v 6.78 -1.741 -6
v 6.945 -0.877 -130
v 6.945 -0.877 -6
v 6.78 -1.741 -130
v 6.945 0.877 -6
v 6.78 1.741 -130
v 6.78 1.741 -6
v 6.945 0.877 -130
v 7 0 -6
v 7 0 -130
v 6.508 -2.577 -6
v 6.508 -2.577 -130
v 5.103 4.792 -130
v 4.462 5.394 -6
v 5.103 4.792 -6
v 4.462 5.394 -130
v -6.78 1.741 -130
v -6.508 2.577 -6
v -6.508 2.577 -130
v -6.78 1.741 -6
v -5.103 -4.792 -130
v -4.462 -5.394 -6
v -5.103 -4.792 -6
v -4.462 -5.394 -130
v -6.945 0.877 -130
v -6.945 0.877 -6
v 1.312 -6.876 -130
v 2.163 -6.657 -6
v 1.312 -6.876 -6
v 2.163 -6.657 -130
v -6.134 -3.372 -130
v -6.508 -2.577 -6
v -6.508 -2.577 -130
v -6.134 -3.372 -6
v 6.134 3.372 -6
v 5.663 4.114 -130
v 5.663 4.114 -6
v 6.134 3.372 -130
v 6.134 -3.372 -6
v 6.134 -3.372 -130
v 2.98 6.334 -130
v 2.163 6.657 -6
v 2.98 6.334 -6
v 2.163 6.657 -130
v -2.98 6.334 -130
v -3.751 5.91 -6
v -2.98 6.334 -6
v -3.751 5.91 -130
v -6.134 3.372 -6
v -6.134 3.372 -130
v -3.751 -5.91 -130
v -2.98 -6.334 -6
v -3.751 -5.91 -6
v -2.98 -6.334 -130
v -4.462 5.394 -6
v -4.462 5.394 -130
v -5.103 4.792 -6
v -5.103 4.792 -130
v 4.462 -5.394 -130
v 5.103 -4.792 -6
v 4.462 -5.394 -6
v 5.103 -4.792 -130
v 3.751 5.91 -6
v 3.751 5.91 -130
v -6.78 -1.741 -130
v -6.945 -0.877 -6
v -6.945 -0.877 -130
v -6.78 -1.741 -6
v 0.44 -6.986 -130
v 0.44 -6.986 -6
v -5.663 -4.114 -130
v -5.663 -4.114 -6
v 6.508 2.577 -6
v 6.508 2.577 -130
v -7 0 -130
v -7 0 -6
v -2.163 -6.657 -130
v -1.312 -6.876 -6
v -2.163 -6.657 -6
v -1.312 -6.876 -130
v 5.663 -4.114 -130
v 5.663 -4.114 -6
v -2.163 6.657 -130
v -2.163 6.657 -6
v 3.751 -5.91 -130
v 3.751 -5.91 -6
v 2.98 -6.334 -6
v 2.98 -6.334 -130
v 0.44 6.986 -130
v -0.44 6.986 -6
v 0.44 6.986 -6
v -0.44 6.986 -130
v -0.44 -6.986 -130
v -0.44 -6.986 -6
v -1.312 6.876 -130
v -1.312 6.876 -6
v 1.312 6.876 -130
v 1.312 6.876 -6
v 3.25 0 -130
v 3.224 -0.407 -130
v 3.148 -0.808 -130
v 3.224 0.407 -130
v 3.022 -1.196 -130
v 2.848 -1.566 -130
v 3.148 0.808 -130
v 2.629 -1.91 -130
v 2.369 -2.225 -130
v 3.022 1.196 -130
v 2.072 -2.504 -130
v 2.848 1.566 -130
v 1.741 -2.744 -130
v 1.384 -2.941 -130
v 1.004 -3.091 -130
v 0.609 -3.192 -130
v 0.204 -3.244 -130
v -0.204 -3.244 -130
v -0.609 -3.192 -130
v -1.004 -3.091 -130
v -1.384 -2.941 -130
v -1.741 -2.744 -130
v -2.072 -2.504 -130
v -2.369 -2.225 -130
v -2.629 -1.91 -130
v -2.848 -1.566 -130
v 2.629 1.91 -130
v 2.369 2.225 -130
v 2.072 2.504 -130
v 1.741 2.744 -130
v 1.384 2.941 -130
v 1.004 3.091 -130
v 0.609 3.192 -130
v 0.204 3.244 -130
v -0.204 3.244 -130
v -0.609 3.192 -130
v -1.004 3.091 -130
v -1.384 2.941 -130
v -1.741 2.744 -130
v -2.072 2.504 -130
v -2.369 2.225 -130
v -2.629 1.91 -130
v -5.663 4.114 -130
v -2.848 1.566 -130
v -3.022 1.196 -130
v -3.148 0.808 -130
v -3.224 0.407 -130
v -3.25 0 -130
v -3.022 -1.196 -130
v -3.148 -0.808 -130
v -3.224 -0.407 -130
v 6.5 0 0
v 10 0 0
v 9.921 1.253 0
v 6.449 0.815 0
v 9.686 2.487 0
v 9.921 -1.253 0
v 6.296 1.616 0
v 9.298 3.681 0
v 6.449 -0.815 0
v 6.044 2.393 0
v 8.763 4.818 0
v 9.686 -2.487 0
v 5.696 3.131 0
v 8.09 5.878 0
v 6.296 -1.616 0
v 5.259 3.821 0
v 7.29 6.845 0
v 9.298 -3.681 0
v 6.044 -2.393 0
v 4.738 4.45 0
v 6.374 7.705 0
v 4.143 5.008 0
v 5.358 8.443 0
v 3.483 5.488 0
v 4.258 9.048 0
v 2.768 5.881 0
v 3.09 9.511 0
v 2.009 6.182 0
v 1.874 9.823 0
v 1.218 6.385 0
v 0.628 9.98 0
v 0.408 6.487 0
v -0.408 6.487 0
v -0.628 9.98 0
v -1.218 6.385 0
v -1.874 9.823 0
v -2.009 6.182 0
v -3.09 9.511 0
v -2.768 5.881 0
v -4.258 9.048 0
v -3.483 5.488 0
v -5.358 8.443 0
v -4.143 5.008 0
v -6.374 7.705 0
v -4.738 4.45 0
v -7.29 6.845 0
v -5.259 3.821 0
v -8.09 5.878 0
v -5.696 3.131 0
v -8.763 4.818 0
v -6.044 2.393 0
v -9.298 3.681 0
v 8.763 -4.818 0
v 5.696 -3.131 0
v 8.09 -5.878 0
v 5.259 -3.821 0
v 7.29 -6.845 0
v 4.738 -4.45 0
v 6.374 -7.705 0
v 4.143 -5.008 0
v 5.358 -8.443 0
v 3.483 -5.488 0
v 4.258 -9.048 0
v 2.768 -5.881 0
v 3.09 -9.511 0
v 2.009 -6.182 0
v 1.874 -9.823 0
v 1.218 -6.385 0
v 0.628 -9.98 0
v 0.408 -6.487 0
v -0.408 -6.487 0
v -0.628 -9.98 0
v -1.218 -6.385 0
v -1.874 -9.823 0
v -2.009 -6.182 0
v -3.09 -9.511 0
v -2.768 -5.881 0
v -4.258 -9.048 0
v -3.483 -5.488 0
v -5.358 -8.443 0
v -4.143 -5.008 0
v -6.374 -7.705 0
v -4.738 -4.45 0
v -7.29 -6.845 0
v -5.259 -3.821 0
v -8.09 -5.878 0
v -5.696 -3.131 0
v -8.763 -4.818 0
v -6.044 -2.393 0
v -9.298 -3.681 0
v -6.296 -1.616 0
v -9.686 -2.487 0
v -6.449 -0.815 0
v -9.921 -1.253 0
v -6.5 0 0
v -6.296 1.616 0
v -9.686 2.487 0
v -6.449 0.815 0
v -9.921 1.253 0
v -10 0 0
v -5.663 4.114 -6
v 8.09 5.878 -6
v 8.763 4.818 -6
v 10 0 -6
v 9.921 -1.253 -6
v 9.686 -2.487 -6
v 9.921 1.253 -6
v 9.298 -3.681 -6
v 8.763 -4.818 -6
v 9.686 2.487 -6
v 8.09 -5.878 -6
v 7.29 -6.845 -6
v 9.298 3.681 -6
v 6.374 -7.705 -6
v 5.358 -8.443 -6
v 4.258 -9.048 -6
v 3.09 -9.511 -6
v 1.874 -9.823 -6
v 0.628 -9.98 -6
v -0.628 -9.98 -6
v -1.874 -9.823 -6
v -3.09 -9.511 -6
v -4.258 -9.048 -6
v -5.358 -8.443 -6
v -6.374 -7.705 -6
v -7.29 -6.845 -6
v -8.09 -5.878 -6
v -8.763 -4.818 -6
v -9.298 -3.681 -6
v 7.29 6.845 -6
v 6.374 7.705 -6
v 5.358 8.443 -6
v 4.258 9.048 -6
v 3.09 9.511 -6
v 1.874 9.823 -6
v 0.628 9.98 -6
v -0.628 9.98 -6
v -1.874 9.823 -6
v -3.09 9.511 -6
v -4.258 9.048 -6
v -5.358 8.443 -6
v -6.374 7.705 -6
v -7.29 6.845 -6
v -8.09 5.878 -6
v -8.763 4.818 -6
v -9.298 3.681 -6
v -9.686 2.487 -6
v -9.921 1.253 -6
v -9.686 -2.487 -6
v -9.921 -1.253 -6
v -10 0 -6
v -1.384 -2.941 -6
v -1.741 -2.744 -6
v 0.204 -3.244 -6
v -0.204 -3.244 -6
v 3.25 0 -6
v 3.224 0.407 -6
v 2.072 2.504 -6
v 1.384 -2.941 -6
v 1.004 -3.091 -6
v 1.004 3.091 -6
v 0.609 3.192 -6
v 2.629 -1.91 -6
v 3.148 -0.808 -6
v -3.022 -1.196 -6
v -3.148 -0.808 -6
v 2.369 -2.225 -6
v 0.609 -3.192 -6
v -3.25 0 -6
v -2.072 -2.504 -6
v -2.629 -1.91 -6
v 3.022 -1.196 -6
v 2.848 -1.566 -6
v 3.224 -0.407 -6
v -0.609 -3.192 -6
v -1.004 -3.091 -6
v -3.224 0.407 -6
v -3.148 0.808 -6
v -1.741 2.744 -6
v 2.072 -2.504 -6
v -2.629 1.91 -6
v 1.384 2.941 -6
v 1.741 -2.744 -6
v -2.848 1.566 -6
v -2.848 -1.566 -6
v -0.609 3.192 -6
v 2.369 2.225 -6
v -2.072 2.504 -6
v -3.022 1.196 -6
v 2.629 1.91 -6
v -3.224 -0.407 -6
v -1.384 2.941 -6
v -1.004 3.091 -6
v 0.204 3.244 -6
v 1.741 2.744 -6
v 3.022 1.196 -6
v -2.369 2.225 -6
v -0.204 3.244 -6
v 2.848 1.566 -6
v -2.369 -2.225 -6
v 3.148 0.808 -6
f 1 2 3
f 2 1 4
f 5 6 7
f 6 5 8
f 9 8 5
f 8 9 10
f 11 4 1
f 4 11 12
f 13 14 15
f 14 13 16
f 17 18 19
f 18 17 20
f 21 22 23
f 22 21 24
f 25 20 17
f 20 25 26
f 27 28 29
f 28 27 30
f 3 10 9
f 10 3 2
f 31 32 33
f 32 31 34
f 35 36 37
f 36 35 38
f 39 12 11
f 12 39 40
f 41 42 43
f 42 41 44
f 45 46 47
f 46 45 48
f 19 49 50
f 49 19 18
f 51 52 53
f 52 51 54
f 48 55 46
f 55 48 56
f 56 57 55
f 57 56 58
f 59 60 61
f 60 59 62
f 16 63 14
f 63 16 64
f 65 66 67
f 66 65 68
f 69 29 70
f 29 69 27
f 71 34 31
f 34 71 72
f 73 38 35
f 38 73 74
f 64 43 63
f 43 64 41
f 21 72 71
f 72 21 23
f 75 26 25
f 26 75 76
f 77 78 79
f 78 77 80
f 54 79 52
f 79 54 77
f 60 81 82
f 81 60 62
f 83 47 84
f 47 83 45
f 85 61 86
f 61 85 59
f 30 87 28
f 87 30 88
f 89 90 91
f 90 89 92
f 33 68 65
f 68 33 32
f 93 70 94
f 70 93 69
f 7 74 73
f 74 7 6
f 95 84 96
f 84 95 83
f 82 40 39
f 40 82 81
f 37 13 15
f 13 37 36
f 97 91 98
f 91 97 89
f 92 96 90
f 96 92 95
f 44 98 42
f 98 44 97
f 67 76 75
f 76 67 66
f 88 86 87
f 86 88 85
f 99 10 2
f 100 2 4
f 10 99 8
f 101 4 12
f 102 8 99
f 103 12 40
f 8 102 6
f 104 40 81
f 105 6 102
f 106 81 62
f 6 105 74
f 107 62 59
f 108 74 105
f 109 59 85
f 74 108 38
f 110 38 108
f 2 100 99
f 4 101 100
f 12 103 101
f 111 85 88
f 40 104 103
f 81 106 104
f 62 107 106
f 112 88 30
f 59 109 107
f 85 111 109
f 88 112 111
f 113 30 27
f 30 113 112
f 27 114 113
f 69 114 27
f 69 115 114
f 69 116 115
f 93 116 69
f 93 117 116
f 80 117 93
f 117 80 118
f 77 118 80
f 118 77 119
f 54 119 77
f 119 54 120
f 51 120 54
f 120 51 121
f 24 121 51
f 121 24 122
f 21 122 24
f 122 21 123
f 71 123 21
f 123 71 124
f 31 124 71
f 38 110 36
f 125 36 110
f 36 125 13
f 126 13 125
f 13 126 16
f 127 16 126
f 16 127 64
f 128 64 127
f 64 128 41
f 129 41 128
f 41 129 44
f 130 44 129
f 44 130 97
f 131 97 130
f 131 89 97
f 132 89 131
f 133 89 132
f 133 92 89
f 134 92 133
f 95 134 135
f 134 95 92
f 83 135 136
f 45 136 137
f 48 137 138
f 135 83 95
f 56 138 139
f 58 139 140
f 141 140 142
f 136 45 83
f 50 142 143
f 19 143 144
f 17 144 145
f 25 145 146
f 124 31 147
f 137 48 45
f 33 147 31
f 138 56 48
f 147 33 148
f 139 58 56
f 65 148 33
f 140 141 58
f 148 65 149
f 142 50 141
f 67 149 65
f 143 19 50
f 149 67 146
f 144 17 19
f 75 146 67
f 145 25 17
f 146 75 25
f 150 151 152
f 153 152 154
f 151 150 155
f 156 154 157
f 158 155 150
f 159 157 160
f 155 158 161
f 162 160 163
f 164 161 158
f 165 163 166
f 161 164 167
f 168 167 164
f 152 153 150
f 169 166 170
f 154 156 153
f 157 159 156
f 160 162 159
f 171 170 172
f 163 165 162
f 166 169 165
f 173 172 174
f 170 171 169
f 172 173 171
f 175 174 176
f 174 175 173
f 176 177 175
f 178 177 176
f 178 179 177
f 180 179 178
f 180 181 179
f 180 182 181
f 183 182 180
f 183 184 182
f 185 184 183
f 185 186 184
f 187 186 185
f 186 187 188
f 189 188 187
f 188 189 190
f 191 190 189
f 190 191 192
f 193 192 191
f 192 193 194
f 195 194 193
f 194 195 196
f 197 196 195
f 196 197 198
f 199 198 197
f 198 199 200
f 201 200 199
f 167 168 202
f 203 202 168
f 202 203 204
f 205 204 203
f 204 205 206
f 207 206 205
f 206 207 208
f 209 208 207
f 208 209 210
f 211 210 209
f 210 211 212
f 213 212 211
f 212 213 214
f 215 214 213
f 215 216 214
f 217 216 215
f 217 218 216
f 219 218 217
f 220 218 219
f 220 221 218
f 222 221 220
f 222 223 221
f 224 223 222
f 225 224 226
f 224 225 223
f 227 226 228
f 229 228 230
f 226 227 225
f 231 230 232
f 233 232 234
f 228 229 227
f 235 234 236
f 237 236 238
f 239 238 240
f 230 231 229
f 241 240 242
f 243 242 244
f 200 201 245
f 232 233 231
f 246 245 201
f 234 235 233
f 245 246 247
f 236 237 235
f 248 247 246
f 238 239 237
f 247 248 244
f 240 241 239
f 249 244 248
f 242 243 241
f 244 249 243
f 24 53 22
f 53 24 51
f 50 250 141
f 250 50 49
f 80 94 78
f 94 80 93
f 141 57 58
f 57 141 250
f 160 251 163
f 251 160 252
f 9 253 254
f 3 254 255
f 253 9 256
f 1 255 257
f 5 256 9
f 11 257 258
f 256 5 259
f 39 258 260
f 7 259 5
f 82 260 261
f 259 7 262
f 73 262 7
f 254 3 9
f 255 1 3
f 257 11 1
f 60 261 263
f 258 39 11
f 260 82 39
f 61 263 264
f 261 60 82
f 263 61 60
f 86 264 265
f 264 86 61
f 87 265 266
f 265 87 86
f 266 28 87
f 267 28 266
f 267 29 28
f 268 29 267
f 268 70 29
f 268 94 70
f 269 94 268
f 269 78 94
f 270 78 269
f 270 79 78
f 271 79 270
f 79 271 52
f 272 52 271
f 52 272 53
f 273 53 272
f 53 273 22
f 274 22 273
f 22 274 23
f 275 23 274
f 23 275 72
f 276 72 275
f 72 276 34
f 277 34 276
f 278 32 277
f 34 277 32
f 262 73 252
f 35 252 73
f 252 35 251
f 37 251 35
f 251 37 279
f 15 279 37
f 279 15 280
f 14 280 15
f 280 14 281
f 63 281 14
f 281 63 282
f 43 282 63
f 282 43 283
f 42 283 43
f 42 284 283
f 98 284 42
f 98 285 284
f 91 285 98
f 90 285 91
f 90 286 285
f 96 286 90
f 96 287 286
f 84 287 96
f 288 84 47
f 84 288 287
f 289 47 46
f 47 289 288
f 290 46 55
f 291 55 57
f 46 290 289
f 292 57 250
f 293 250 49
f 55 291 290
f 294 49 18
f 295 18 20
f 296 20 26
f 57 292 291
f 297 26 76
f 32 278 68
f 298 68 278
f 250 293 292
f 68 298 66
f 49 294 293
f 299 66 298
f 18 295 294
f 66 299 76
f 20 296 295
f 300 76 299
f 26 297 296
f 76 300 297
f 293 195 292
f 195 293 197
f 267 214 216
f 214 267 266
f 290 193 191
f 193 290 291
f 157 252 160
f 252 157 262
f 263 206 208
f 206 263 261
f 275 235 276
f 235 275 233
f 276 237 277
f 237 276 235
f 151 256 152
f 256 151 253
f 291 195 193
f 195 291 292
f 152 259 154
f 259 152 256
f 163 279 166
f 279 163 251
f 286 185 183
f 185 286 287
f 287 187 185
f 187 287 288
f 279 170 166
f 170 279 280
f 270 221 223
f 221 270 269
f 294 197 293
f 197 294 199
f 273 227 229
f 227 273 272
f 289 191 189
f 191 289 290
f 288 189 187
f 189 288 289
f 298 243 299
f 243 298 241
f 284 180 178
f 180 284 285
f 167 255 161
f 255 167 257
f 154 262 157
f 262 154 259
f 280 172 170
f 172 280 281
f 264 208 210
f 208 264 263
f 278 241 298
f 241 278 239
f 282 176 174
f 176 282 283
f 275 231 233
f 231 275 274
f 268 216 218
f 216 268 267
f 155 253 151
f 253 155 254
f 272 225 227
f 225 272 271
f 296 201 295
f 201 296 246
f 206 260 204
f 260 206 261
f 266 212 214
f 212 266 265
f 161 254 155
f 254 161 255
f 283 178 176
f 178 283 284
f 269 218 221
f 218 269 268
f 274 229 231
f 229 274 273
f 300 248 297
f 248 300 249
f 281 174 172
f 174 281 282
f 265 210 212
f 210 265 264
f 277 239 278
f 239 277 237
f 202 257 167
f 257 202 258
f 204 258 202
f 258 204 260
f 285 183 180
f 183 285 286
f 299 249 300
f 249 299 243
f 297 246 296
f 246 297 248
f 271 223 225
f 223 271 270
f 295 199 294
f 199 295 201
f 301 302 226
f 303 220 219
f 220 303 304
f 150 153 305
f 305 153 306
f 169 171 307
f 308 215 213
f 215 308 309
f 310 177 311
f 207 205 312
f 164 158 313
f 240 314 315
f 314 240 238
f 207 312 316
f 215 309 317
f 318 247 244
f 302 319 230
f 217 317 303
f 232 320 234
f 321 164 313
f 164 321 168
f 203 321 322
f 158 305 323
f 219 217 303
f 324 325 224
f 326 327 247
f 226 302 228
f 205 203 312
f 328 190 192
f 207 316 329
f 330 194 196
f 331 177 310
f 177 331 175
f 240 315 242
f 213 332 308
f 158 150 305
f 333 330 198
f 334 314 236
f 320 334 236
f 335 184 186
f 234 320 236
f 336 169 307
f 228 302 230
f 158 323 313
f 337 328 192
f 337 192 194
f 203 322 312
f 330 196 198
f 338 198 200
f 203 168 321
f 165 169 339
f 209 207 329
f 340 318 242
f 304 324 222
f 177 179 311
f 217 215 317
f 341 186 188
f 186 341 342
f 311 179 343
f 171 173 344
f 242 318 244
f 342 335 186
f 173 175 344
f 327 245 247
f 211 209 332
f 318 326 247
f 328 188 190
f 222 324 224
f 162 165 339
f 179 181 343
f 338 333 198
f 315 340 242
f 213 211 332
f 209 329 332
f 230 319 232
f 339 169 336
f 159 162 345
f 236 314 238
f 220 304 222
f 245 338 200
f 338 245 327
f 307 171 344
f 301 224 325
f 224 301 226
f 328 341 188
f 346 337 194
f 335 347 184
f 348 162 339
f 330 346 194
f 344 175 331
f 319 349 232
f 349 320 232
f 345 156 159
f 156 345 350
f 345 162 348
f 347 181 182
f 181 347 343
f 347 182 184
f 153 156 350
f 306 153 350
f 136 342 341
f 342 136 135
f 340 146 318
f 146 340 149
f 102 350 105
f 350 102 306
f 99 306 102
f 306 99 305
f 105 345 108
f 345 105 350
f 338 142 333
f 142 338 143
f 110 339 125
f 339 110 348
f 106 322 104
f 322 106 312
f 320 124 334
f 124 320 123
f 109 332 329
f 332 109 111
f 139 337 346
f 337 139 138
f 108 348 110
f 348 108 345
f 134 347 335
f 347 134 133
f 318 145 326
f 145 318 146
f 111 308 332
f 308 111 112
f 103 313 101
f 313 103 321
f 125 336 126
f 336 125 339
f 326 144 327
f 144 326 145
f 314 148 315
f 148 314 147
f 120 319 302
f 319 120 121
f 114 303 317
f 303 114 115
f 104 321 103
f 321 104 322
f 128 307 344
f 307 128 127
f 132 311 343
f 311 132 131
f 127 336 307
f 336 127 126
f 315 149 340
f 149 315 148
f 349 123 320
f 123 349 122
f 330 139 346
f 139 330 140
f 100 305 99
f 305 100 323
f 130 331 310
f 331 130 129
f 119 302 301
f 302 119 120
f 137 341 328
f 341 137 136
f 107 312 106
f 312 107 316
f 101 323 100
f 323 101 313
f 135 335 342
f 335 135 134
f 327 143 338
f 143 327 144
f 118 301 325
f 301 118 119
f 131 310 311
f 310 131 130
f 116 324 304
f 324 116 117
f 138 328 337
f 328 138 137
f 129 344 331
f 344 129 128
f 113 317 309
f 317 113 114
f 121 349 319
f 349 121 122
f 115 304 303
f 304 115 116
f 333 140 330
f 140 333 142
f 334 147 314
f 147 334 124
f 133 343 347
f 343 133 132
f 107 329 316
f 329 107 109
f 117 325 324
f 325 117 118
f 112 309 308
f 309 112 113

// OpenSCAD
$fn = 50;


difference() {
	union() {
		translate(v = [0, 0, -130.0000000000]) {
			cylinder(h = 130, r = 7.0000000000);
		}
		translate(v = [0, 0, -6.0000000000]) {
			cylinder(h = 6, r = 10.0000000000);
		}
	}
	union() {
		translate(v = [0, 0, 0]) {
			rotate(a = [0, 0, 0]) {
				difference() {
					union() {
						#translate(v = [0, 0, -130.0000000000]) {
							cylinder(h = 130, r = 2.2500000000);
						}
						#translate(v = [0, 0, -6]) {
							cylinder(h = 6, r = 7.0000000000, r1 = 3.2500000000, r2 = 6.5000000000);
						}
						#translate(v = [0, 0, -130.0000000000]) {
							cylinder(h = 130, r = 3.2500000000);
						}
						#translate(v = [0, 0, -130.0000000000]) {
							cylinder(h = 130, r = 2.2500000000);
						}
					}
					union();
				}
			}
		}
	}
}
